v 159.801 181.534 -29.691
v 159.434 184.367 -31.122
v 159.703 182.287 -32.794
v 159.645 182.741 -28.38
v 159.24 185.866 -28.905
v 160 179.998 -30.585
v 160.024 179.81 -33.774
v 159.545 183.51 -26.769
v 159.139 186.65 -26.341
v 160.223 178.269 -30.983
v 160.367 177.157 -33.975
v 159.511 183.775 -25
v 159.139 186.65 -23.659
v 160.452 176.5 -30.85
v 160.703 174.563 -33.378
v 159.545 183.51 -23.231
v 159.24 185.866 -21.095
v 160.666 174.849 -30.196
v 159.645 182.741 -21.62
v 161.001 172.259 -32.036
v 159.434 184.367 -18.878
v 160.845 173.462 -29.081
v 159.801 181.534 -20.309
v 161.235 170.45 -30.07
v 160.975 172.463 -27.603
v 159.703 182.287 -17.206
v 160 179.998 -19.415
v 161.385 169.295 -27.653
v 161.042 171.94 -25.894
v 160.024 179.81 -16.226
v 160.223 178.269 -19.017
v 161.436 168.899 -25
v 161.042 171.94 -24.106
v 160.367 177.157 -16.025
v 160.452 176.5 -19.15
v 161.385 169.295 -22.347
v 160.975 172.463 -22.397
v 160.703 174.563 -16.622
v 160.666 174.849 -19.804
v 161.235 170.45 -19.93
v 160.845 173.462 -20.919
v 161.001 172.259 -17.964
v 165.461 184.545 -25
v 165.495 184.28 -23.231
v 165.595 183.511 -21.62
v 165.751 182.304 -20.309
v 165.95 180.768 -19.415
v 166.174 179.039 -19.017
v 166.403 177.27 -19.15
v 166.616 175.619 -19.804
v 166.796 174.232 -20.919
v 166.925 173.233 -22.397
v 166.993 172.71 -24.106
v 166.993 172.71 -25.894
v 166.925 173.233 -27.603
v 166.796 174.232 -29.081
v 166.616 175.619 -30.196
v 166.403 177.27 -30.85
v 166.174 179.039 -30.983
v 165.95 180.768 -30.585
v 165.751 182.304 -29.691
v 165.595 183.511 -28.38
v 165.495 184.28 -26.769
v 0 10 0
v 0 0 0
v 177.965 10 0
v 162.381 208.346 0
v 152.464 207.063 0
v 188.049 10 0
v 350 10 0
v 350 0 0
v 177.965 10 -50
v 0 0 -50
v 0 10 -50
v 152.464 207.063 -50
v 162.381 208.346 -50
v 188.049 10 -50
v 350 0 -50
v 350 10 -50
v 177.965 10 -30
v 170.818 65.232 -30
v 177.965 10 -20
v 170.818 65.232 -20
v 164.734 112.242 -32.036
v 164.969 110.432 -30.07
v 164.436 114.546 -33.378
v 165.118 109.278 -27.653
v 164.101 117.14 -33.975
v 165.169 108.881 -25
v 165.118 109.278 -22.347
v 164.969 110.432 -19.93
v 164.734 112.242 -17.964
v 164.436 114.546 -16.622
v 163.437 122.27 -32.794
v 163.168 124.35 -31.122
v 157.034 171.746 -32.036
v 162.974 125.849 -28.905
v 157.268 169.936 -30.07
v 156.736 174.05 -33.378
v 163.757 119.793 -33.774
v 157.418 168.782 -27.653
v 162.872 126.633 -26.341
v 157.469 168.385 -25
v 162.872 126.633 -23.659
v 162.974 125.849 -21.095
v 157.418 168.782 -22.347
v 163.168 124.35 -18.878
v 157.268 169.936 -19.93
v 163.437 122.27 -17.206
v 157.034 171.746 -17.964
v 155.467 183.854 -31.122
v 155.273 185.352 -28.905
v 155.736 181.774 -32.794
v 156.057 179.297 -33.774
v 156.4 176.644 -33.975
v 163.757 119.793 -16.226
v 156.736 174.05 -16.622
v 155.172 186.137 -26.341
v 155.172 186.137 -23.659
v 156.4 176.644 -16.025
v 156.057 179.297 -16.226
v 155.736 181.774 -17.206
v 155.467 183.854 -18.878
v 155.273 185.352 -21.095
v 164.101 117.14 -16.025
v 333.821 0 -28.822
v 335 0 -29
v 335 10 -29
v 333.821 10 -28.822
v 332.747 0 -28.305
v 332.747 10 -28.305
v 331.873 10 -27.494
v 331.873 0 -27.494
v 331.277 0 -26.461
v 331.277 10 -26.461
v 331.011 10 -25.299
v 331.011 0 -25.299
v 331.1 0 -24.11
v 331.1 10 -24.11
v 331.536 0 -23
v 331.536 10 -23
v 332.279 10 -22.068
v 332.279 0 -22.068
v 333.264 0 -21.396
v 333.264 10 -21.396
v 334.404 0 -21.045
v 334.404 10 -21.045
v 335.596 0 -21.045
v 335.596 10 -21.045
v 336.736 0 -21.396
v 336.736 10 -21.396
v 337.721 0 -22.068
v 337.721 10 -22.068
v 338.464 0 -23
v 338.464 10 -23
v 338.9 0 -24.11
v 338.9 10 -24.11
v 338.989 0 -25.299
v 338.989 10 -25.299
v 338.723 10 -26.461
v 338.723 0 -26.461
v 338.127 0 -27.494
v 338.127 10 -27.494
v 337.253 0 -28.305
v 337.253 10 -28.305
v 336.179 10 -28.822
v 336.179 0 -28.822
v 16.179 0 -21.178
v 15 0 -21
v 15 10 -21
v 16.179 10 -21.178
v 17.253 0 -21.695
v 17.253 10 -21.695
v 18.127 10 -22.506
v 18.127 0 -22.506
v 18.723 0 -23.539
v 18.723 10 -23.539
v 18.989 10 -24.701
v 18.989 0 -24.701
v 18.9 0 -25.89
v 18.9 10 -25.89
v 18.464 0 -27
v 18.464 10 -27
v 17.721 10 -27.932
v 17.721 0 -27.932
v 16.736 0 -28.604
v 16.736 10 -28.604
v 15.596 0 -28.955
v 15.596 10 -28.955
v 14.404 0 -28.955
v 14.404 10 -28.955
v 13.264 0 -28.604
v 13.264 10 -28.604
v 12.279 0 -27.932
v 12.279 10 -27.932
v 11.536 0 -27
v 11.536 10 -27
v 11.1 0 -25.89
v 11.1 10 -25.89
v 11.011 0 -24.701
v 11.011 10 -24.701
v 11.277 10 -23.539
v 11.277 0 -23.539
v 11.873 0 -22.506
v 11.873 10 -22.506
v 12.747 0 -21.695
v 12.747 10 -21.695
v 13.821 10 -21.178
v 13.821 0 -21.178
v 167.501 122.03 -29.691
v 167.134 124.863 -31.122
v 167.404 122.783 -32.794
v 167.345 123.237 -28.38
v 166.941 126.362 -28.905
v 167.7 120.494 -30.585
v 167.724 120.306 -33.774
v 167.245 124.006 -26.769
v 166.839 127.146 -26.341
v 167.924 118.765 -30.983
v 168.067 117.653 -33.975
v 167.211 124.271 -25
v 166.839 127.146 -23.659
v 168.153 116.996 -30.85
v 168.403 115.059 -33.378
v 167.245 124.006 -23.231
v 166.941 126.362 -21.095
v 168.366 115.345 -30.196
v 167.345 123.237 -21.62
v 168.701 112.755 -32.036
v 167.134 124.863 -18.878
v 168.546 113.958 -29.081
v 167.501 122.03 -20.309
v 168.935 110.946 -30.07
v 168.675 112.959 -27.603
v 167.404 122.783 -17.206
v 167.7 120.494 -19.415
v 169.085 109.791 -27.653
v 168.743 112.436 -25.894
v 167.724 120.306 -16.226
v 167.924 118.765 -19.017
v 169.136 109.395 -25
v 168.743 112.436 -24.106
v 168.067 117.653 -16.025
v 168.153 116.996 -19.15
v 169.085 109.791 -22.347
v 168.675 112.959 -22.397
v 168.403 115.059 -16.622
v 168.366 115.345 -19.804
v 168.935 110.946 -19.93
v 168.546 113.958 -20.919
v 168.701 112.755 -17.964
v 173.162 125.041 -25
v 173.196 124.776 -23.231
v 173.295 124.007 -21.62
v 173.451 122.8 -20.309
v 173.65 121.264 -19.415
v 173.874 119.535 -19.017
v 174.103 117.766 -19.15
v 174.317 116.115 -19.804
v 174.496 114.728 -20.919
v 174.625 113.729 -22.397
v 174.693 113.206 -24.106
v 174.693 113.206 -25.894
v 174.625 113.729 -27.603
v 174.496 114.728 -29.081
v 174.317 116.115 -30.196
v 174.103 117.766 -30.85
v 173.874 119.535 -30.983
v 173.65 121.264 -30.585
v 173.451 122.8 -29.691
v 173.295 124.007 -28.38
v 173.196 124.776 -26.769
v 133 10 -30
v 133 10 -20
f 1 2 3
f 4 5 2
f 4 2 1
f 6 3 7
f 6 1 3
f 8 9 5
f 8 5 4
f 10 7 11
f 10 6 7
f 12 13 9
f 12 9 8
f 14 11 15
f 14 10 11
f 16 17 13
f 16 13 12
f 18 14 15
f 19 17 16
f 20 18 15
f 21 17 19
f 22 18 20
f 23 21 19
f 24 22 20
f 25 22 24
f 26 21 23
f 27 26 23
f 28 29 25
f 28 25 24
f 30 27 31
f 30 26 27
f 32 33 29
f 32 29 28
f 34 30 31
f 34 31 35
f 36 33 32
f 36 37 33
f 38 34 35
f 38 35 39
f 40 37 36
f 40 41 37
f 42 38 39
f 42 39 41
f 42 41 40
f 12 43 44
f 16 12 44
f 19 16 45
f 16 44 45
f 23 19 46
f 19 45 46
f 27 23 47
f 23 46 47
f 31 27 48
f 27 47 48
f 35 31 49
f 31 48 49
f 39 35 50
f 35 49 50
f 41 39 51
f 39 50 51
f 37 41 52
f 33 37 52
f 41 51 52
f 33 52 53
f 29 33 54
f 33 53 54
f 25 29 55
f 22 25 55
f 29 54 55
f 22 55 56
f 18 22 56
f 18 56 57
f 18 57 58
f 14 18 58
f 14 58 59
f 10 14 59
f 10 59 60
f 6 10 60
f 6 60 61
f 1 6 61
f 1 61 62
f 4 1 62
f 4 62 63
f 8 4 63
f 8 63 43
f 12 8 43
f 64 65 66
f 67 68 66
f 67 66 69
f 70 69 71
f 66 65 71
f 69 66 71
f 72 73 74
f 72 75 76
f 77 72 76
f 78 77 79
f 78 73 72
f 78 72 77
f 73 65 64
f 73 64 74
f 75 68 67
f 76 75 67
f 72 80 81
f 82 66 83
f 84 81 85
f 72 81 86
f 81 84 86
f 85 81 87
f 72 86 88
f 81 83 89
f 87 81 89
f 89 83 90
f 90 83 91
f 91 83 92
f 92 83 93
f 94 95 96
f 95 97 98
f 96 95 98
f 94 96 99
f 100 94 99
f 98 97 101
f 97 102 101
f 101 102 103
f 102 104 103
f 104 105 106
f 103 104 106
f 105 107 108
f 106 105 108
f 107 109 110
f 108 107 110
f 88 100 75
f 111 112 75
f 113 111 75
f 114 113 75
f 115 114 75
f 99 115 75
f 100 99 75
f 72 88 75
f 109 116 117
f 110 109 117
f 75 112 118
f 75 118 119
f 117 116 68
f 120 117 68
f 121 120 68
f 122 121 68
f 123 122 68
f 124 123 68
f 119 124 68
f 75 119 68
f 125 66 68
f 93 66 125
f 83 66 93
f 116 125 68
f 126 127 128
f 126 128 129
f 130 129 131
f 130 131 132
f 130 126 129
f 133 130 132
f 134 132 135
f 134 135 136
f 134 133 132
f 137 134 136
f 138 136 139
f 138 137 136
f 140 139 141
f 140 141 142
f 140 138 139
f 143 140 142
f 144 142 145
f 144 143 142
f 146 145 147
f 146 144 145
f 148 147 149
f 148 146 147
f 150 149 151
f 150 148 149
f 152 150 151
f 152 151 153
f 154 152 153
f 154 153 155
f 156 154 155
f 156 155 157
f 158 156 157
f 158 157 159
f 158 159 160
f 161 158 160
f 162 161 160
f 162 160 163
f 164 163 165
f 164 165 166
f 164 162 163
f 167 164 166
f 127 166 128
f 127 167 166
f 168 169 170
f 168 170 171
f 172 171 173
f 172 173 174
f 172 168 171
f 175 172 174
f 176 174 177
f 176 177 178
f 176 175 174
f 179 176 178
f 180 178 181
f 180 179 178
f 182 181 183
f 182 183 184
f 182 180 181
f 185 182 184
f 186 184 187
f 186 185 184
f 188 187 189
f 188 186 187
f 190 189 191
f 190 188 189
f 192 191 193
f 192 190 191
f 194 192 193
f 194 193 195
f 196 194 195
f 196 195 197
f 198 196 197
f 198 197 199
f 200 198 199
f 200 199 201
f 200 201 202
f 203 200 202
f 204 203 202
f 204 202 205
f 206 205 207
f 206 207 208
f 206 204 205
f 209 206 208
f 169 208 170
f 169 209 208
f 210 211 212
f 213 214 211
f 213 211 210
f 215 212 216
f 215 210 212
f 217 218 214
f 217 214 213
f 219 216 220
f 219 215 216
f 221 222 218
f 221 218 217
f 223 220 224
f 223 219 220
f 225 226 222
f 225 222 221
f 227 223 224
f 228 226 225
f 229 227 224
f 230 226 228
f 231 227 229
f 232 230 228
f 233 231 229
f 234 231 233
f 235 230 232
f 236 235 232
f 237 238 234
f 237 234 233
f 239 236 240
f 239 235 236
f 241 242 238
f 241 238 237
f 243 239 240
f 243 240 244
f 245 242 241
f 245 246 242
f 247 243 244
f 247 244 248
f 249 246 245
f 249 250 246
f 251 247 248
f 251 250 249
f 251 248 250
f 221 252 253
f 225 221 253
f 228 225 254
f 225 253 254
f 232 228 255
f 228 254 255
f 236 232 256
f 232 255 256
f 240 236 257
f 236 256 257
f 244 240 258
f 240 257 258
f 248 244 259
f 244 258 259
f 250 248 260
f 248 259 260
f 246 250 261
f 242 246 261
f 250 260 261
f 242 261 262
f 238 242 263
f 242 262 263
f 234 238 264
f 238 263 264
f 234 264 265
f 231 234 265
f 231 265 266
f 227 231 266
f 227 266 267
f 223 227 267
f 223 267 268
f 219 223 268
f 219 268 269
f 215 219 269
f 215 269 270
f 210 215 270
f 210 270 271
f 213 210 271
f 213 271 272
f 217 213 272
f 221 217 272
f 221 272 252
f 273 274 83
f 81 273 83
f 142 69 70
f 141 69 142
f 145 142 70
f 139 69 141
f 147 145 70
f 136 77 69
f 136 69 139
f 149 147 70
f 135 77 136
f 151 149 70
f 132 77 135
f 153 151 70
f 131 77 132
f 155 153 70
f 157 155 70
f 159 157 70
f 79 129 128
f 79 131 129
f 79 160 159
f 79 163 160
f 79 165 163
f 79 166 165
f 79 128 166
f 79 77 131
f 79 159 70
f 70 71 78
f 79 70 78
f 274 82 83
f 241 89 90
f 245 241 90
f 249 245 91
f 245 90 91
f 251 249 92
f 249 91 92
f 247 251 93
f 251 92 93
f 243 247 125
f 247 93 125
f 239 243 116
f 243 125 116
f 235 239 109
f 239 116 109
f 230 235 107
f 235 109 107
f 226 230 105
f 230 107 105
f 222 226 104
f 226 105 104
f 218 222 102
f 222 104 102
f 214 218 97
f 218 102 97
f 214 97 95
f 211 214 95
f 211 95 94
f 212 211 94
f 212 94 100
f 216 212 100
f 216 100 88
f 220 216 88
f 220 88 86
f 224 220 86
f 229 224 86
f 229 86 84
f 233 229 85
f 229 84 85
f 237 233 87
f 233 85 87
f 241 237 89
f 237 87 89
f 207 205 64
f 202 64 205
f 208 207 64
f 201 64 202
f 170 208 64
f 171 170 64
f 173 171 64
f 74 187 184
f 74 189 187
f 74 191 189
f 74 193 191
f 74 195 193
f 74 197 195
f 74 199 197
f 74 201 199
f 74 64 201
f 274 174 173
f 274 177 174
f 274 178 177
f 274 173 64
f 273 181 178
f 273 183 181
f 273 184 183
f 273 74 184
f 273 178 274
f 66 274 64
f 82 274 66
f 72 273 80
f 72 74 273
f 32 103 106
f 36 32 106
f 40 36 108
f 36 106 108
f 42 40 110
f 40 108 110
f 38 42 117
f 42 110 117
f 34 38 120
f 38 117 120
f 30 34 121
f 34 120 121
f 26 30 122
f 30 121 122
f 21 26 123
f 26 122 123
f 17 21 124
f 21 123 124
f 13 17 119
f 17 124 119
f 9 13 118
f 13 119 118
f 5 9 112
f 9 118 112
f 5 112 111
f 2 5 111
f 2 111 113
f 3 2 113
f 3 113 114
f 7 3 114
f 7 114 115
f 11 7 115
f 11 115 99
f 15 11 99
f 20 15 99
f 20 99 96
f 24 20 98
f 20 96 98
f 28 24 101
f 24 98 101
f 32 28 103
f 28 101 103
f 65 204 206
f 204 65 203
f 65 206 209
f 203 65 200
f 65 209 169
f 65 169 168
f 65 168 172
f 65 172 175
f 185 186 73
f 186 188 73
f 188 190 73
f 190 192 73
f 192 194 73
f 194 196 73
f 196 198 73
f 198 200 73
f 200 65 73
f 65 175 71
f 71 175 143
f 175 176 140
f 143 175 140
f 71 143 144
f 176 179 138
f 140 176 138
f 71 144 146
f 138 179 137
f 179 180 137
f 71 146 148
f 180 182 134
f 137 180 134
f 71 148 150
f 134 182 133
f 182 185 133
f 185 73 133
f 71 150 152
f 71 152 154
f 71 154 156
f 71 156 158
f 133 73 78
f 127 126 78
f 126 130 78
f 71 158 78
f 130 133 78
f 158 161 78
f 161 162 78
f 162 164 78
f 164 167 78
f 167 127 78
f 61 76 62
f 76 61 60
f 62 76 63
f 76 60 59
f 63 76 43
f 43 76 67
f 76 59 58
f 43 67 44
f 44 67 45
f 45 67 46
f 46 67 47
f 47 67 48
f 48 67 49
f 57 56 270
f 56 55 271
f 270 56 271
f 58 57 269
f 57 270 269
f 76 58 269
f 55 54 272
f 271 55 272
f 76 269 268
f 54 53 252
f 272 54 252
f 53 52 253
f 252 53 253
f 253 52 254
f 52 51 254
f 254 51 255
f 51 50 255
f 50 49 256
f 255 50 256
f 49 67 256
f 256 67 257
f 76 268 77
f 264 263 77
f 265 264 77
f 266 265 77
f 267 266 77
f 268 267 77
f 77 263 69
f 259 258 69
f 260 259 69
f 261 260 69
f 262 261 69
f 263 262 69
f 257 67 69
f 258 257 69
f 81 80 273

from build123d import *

# Parameters (mm, degrees)
SKETCH_1_W          = 350
SKETCH_1_H          = 50
SKETCH_1_R          = 4
EXTRUDE_1_DEPTH     = 10
EXTRUDE_2_DEPTH     = 50
CUT_EXTRUDE_1_DEPTH = 20
CUT_EXTRUDE_2_DEPTH = 20
SKETCH_5_R          = 6
CUT_EXTRUDE_3_DEPTH = 20
SKETCH_6_R          = 9
CUT_EXTRUDE_4_DEPTH = 4


with BuildPart() as part:
    # 草图1 → 凸台-拉伸1 (new body)
    with BuildSketch(Plane(origin=(0, 0, 0), x_dir=(1, 0, 0), z_dir=(0, 1, 0))):
        with Locations((175, 25)):
            Rectangle(SKETCH_1_W, SKETCH_1_H)
        with Locations(Location((15, 25, 0), (0, 0, 270))):
            Circle(SKETCH_1_R, mode=Mode.SUBTRACT)
        with Locations(Location((335, 25, 0), (0, 0, 90))):
            Circle(SKETCH_1_R, mode=Mode.SUBTRACT)
    extrude(amount=EXTRUDE_1_DEPTH)

    # 草图2 → 凸台-拉伸2 (add)
    with BuildSketch(Plane.XY):
        Polygon((170.81786786, 65.231720812), (152.463883228, 207.062743075), (162.381189023, 208.346115889), (188.0486453, 10), (175, 10), (133, 10), align=None)
    extrude(amount=-EXTRUDE_2_DEPTH)

    # 草图3 → 切除-拉伸1 (cut)
    with BuildSketch(Plane.XY):
        Polygon((177.96526156, 10), (133, 10), (170.81786786, 65.231720812), align=None)
    extrude(amount=-CUT_EXTRUDE_1_DEPTH, mode=Mode.SUBTRACT)

    # 草图4 → 切除-拉伸2 (cut)
    with BuildSketch(Plane(origin=(0, 0, -50), x_dir=(-1, 0, 0), z_dir=(0, 0, -1))):
        Polygon((-170.81786786, 65.231720812), (-177.96526156, 10), (-133, 10), align=None)
    extrude(amount=-CUT_EXTRUDE_2_DEPTH, mode=Mode.SUBTRACT)

    # 草图5 → 切除-拉伸3 (cut)
    with BuildSketch(Plane(origin=(186.224158089, 24.098785167, 0), x_dir=(0, 0, -1), z_dir=(0.9917305794448423, 0.12833728138774617, 0))):
        with Locations(Location((25, 95.783653888, 0), (0, 0, 90))):
            Circle(SKETCH_5_R)
        with Locations(Location((25, 155.783653888, 0), (0, 0, 90))):
            Circle(SKETCH_5_R)
    extrude(amount=-CUT_EXTRUDE_3_DEPTH, mode=Mode.SUBTRACT)

    # 草图6 → 切除-拉伸4 (cut)
    with BuildSketch(Plane(origin=(176.306852295, 22.815412353, 0), x_dir=(0, 0, 1), z_dir=(-0.9917305794448422, -0.1283372813877468, 0))):
        with Locations(Location((-25, 155.783653888, 0), (0, 0, 270))):
            Circle(SKETCH_6_R)
        with Locations(Location((-25, 95.783653888, 0), (0, 0, 270))):
            Circle(SKETCH_6_R)
    extrude(amount=-CUT_EXTRUDE_4_DEPTH, mode=Mode.SUBTRACT)


solid = part.part
